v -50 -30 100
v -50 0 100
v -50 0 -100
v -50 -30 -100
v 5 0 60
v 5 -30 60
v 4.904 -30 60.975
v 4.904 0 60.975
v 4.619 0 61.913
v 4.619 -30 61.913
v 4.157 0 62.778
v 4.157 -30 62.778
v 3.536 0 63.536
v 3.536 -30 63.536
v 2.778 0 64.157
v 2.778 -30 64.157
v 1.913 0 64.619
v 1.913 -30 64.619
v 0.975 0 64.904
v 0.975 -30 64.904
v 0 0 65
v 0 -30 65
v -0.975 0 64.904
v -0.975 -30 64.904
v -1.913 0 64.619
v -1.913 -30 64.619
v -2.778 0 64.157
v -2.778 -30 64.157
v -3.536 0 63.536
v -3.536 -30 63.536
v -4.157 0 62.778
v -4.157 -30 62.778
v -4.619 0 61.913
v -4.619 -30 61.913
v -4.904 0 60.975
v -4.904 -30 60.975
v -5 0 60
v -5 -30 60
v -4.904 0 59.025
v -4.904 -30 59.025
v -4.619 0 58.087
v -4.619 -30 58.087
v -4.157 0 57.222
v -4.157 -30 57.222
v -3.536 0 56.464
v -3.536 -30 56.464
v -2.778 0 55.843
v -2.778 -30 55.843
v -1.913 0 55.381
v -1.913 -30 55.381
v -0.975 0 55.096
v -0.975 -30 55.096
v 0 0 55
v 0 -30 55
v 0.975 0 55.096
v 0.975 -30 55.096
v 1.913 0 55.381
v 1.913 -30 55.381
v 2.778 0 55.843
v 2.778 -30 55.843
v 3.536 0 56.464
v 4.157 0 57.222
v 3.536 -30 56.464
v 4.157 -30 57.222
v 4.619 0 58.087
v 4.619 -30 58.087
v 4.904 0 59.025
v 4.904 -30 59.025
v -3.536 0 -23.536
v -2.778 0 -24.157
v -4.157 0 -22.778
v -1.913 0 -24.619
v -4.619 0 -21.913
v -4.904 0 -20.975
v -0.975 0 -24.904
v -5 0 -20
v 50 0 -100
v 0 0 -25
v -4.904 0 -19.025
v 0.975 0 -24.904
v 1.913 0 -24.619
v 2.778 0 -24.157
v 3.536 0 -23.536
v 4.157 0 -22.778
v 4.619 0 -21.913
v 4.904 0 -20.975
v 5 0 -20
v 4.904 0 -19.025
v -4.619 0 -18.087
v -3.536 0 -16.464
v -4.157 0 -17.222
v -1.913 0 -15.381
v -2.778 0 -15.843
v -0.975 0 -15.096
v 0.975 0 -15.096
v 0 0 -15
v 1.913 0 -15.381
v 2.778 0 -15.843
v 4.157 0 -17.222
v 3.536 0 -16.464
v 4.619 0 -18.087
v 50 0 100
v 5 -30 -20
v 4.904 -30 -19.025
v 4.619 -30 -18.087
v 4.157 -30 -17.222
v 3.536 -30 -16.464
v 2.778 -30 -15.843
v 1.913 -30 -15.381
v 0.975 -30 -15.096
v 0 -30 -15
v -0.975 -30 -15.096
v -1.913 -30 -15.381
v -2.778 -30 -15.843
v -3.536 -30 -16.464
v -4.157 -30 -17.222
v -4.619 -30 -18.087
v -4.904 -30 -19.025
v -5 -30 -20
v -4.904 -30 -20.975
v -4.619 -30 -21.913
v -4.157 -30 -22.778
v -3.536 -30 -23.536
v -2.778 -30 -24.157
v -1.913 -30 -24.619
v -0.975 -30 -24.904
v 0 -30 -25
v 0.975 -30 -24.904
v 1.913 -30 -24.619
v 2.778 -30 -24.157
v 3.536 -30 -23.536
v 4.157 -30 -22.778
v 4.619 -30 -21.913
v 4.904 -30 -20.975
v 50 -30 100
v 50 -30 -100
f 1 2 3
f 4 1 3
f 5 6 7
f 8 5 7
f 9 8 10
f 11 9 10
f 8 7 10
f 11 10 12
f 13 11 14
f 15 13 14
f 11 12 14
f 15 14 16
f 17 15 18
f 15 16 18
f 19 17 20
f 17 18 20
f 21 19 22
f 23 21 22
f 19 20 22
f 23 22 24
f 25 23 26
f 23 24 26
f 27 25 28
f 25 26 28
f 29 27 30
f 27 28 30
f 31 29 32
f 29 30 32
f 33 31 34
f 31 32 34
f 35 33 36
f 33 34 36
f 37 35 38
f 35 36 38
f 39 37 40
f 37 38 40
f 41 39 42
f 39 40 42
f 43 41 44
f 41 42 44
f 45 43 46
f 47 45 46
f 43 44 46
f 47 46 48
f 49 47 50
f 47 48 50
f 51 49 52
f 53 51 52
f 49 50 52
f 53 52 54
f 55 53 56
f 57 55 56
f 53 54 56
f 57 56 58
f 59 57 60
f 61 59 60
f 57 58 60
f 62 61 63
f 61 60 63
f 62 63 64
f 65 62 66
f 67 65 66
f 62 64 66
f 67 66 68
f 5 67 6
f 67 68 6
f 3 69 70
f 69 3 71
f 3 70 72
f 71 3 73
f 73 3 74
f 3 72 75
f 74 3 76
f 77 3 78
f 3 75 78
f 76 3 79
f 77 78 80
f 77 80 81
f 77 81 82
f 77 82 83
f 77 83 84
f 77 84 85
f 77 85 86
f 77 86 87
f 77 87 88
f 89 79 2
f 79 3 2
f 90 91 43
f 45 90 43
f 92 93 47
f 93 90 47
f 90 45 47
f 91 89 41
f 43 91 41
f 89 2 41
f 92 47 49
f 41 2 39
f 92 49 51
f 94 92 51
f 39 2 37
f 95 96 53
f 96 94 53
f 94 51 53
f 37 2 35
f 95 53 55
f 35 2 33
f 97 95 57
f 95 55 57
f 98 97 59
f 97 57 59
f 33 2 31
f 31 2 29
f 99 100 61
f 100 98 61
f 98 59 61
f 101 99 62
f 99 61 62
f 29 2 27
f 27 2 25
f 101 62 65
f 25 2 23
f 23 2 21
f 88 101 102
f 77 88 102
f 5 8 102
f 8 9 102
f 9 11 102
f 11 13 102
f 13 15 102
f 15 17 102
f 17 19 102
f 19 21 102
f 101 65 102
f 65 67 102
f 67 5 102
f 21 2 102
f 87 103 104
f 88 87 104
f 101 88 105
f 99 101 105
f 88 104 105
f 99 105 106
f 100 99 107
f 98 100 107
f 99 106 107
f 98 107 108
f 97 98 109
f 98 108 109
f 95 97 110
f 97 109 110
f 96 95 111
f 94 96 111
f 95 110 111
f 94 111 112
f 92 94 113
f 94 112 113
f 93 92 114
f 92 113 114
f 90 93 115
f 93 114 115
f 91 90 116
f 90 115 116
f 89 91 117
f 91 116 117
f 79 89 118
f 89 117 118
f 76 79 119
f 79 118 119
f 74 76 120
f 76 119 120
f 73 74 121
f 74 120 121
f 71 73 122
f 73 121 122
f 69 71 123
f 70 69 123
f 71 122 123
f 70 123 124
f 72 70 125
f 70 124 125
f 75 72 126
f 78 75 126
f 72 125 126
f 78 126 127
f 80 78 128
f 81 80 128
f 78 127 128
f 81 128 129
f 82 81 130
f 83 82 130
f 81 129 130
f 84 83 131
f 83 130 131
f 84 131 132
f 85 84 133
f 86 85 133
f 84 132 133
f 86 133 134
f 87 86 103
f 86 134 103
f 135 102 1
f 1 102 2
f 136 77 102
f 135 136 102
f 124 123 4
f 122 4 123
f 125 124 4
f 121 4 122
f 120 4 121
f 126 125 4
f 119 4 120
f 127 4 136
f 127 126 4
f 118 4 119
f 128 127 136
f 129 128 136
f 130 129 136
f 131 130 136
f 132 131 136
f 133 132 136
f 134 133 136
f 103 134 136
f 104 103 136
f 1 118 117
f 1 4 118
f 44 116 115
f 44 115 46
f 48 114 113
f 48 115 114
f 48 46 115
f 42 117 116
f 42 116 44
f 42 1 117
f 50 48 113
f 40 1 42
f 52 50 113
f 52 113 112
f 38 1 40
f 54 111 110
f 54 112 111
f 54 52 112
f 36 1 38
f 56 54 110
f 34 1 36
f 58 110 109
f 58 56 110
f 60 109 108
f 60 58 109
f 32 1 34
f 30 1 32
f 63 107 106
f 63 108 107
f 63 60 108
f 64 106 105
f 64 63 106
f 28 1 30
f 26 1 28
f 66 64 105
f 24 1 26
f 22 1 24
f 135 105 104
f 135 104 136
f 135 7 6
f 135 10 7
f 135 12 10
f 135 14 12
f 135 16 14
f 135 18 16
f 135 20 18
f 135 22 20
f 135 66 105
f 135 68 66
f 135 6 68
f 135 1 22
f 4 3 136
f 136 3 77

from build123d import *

# Parameters (mm, degrees)
F1_DEPTH = 30
F2_R     = 5
F3_DEPTH = 30
F4_DEPTH = 30


with BuildPart() as f1:
    # F0 (on Front) → F1 (new body)
    with BuildSketch(Plane.XZ):
        Polygon((-50, 100), (-50, 0), (-50, -100), (0, -100), (50, -100), (50, 0), (50, 100), (0, 100), align=None)
    extrude(amount=F1_DEPTH)

    # F2 (on face) → F3 (cut)
    with BuildSketch(Plane.XZ.offset(30)):
        with Locations((0, 60)):
            Circle(F2_R)
    extrude(amount=-F3_DEPTH, mode=Mode.SUBTRACT)

    # F2 (on face) → F4 (cut)
    with BuildSketch(Plane.XZ.offset(30)):
        with Locations((0, -20)):
            Circle(F2_R)
        with Locations((0, 60)):
            Circle(F2_R)
    extrude(amount=-F4_DEPTH, mode=Mode.SUBTRACT)


solid = f1.part
